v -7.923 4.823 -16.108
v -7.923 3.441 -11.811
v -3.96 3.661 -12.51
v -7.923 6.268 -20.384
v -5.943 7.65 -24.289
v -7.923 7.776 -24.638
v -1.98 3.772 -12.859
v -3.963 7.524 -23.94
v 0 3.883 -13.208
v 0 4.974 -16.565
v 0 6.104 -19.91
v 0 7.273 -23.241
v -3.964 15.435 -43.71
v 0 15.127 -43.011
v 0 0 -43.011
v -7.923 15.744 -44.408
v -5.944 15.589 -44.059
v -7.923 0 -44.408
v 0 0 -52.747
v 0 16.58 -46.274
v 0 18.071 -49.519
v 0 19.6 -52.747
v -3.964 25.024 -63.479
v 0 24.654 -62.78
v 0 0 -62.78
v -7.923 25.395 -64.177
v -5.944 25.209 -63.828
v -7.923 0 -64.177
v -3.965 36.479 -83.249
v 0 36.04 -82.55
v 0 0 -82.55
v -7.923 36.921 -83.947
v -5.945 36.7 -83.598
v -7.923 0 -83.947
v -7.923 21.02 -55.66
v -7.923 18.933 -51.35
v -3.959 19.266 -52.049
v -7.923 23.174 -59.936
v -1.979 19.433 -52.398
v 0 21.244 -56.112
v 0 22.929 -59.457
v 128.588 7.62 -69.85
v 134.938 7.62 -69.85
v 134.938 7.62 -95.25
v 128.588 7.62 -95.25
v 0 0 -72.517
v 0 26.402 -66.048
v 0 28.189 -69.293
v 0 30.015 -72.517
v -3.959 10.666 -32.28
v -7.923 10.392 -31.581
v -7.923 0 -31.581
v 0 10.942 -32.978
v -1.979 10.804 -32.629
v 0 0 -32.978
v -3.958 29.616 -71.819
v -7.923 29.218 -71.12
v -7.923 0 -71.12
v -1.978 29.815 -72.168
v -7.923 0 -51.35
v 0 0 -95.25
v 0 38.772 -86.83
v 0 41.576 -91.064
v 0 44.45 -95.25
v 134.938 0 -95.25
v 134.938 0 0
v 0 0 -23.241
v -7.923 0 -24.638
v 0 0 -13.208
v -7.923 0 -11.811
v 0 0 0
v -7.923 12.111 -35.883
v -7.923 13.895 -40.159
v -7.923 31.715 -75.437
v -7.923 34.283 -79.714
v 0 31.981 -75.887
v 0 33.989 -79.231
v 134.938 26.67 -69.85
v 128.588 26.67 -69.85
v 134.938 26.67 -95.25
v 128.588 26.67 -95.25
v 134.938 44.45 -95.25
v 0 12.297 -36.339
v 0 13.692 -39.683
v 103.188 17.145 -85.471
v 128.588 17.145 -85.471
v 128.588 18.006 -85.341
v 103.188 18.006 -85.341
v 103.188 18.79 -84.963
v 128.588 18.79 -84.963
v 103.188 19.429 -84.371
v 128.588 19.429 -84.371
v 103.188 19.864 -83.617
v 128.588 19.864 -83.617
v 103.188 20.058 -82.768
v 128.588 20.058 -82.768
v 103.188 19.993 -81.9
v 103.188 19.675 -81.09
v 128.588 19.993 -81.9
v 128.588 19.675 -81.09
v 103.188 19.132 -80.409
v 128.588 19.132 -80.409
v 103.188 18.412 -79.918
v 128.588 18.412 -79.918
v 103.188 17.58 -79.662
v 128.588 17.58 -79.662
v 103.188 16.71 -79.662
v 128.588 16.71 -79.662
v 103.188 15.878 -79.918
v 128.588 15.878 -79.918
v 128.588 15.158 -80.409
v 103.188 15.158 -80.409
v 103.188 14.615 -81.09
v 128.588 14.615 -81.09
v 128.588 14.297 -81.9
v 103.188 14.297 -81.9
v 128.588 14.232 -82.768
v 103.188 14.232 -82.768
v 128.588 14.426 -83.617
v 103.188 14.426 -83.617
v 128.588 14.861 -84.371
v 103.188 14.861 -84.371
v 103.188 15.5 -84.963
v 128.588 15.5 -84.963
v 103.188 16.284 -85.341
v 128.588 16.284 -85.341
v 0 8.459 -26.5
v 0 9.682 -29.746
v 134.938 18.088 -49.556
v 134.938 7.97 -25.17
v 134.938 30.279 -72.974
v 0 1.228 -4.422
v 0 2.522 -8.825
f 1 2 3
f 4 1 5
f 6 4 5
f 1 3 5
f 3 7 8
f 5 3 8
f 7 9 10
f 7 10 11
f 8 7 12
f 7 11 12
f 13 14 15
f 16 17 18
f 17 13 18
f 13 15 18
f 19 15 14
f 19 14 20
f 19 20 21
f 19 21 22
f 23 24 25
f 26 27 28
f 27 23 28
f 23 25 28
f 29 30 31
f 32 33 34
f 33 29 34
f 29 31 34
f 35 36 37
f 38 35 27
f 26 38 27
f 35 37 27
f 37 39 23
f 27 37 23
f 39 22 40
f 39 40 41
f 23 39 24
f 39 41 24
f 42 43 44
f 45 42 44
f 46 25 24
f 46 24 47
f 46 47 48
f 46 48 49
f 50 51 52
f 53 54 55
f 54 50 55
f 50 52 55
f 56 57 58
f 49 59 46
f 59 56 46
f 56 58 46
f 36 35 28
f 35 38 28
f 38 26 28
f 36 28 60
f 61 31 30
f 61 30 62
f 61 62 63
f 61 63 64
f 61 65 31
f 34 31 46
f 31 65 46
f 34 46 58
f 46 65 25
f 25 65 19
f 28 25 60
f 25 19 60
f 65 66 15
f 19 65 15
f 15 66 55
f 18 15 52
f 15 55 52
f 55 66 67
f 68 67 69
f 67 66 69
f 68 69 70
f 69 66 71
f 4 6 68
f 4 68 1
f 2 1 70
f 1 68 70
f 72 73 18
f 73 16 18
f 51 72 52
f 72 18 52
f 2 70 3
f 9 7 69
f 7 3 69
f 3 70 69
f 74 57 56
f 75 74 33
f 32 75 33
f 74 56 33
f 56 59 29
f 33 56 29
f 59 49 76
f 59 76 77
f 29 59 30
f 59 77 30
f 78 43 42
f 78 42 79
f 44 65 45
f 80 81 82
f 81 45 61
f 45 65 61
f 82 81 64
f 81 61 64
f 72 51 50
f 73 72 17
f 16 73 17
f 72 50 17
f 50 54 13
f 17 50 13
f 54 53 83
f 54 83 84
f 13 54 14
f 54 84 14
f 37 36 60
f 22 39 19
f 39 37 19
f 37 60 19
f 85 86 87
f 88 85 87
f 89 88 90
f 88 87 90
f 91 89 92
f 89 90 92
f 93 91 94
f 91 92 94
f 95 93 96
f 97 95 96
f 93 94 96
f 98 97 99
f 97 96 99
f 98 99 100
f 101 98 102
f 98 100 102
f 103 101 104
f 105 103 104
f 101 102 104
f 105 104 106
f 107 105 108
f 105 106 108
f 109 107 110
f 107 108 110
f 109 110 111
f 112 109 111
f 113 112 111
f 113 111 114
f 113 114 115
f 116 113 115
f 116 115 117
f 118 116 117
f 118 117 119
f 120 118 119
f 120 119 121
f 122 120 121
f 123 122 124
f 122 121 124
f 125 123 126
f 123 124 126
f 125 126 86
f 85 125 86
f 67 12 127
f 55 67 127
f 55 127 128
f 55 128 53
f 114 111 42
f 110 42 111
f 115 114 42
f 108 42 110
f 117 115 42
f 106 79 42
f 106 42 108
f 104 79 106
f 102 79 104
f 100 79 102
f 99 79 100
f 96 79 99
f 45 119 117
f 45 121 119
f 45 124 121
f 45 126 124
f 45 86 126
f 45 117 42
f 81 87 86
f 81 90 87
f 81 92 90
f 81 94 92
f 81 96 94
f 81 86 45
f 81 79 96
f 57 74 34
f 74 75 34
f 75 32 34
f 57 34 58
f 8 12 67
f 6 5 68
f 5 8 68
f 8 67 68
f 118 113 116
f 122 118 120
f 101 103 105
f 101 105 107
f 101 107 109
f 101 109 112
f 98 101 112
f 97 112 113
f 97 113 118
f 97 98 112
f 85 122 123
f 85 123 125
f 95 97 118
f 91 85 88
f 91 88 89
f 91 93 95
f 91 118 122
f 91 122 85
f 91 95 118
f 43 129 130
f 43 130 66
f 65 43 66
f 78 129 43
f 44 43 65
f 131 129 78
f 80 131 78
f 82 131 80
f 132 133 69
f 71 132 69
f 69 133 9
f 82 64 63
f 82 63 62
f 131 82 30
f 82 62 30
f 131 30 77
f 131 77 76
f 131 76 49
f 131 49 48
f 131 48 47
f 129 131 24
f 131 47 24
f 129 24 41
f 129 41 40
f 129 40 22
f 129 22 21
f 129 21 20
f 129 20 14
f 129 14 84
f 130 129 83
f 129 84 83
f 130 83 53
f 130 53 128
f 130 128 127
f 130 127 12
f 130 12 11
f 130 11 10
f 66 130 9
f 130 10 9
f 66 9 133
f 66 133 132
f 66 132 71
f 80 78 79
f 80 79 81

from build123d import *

# Parameters (mm, degrees)
BOSS_EXTRUDE1_DEPTH = 134.9375
SKETCH4_W           = 25.4
SKETCH4_H           = 19.05
CUT_EXTRUDE1_DEPTH  = 6.35
SKETCH6_R           = 2.921
CUT_EXTRUDE3_DEPTH  = 25.4
BOSS_EXTRUDE2_DEPTH = 38.1
CUT_EXTRUDE4_DEPTH  = 143.860280702


with BuildPart() as part:
    # Sketch3 → Boss-Extrude1 (new body)
    with BuildSketch(Plane(origin=(0, 0, 0), x_dir=(0, 0, -1), z_dir=(1, 0, 0))):
        with BuildLine():
            Line((0, 0), (95.25, 0))
            Line((95.25, 0), (95.25, 44.45))
            ThreePointArc((95.25, 44.45), (49.555547135, 18.088113282), (0, 0))
        make_face()
    extrude(amount=BOSS_EXTRUDE1_DEPTH)

    # Sketch4 → Cut-Extrude1 (cut)
    with BuildSketch(Plane(origin=(134.9375, 0, 0), x_dir=(0, 0, -1), z_dir=(1, 0, 0))):
        with Locations((82.55, 17.145)):
            Rectangle(SKETCH4_W, SKETCH4_H)
    extrude(amount=-CUT_EXTRUDE1_DEPTH, mode=Mode.SUBTRACT)

    # Sketch6 → Cut-Extrude3 (cut)
    with BuildSketch(Plane(origin=(128.5875, 0, 0), x_dir=(0, 0, -1), z_dir=(1, 0, 0))):
        with Locations((82.55, 17.145)):
            Circle(SKETCH6_R)
    extrude(amount=-CUT_EXTRUDE3_DEPTH, mode=Mode.SUBTRACT)

    # Sketch7 → Boss-Extrude2 (add)
    with BuildSketch(Plane.XZ):
        Polygon((0, -82.55), (-7.922780702, -83.947), (-7.922780702, -71.12), (0, -72.517), align=None)
        Polygon((0, -62.780333333), (-7.922780702, -64.177333333), (-7.922780702, -51.350333333), (0, -52.747333333), align=None)
        Polygon((0, -43.010666667), (-7.922780702, -44.407666667), (-7.922780702, -31.580666667), (0, -32.977666667), align=None)
        Polygon((0, -23.241), (-7.922780702, -24.638), (-7.922780702, -11.811), (0, -13.208), align=None)
    extrude(amount=-BOSS_EXTRUDE2_DEPTH)

    # Sketch8 → Cut-Extrude4 (cut, through all)
    with BuildSketch(Plane(origin=(134.9375, 0, 0), x_dir=(0, 0, -1), z_dir=(1, 0, 0))):
        with BuildLine():
            Line((95.25, 44.45), (0, 44.45))
            Line((0, 44.45), (0, 0))
            ThreePointArc((0, 0), (49.555547135, 18.088113282), (95.25, 44.45))
        make_face()
    extrude(amount=-CUT_EXTRUDE4_DEPTH, mode=Mode.SUBTRACT)


solid = part.part
